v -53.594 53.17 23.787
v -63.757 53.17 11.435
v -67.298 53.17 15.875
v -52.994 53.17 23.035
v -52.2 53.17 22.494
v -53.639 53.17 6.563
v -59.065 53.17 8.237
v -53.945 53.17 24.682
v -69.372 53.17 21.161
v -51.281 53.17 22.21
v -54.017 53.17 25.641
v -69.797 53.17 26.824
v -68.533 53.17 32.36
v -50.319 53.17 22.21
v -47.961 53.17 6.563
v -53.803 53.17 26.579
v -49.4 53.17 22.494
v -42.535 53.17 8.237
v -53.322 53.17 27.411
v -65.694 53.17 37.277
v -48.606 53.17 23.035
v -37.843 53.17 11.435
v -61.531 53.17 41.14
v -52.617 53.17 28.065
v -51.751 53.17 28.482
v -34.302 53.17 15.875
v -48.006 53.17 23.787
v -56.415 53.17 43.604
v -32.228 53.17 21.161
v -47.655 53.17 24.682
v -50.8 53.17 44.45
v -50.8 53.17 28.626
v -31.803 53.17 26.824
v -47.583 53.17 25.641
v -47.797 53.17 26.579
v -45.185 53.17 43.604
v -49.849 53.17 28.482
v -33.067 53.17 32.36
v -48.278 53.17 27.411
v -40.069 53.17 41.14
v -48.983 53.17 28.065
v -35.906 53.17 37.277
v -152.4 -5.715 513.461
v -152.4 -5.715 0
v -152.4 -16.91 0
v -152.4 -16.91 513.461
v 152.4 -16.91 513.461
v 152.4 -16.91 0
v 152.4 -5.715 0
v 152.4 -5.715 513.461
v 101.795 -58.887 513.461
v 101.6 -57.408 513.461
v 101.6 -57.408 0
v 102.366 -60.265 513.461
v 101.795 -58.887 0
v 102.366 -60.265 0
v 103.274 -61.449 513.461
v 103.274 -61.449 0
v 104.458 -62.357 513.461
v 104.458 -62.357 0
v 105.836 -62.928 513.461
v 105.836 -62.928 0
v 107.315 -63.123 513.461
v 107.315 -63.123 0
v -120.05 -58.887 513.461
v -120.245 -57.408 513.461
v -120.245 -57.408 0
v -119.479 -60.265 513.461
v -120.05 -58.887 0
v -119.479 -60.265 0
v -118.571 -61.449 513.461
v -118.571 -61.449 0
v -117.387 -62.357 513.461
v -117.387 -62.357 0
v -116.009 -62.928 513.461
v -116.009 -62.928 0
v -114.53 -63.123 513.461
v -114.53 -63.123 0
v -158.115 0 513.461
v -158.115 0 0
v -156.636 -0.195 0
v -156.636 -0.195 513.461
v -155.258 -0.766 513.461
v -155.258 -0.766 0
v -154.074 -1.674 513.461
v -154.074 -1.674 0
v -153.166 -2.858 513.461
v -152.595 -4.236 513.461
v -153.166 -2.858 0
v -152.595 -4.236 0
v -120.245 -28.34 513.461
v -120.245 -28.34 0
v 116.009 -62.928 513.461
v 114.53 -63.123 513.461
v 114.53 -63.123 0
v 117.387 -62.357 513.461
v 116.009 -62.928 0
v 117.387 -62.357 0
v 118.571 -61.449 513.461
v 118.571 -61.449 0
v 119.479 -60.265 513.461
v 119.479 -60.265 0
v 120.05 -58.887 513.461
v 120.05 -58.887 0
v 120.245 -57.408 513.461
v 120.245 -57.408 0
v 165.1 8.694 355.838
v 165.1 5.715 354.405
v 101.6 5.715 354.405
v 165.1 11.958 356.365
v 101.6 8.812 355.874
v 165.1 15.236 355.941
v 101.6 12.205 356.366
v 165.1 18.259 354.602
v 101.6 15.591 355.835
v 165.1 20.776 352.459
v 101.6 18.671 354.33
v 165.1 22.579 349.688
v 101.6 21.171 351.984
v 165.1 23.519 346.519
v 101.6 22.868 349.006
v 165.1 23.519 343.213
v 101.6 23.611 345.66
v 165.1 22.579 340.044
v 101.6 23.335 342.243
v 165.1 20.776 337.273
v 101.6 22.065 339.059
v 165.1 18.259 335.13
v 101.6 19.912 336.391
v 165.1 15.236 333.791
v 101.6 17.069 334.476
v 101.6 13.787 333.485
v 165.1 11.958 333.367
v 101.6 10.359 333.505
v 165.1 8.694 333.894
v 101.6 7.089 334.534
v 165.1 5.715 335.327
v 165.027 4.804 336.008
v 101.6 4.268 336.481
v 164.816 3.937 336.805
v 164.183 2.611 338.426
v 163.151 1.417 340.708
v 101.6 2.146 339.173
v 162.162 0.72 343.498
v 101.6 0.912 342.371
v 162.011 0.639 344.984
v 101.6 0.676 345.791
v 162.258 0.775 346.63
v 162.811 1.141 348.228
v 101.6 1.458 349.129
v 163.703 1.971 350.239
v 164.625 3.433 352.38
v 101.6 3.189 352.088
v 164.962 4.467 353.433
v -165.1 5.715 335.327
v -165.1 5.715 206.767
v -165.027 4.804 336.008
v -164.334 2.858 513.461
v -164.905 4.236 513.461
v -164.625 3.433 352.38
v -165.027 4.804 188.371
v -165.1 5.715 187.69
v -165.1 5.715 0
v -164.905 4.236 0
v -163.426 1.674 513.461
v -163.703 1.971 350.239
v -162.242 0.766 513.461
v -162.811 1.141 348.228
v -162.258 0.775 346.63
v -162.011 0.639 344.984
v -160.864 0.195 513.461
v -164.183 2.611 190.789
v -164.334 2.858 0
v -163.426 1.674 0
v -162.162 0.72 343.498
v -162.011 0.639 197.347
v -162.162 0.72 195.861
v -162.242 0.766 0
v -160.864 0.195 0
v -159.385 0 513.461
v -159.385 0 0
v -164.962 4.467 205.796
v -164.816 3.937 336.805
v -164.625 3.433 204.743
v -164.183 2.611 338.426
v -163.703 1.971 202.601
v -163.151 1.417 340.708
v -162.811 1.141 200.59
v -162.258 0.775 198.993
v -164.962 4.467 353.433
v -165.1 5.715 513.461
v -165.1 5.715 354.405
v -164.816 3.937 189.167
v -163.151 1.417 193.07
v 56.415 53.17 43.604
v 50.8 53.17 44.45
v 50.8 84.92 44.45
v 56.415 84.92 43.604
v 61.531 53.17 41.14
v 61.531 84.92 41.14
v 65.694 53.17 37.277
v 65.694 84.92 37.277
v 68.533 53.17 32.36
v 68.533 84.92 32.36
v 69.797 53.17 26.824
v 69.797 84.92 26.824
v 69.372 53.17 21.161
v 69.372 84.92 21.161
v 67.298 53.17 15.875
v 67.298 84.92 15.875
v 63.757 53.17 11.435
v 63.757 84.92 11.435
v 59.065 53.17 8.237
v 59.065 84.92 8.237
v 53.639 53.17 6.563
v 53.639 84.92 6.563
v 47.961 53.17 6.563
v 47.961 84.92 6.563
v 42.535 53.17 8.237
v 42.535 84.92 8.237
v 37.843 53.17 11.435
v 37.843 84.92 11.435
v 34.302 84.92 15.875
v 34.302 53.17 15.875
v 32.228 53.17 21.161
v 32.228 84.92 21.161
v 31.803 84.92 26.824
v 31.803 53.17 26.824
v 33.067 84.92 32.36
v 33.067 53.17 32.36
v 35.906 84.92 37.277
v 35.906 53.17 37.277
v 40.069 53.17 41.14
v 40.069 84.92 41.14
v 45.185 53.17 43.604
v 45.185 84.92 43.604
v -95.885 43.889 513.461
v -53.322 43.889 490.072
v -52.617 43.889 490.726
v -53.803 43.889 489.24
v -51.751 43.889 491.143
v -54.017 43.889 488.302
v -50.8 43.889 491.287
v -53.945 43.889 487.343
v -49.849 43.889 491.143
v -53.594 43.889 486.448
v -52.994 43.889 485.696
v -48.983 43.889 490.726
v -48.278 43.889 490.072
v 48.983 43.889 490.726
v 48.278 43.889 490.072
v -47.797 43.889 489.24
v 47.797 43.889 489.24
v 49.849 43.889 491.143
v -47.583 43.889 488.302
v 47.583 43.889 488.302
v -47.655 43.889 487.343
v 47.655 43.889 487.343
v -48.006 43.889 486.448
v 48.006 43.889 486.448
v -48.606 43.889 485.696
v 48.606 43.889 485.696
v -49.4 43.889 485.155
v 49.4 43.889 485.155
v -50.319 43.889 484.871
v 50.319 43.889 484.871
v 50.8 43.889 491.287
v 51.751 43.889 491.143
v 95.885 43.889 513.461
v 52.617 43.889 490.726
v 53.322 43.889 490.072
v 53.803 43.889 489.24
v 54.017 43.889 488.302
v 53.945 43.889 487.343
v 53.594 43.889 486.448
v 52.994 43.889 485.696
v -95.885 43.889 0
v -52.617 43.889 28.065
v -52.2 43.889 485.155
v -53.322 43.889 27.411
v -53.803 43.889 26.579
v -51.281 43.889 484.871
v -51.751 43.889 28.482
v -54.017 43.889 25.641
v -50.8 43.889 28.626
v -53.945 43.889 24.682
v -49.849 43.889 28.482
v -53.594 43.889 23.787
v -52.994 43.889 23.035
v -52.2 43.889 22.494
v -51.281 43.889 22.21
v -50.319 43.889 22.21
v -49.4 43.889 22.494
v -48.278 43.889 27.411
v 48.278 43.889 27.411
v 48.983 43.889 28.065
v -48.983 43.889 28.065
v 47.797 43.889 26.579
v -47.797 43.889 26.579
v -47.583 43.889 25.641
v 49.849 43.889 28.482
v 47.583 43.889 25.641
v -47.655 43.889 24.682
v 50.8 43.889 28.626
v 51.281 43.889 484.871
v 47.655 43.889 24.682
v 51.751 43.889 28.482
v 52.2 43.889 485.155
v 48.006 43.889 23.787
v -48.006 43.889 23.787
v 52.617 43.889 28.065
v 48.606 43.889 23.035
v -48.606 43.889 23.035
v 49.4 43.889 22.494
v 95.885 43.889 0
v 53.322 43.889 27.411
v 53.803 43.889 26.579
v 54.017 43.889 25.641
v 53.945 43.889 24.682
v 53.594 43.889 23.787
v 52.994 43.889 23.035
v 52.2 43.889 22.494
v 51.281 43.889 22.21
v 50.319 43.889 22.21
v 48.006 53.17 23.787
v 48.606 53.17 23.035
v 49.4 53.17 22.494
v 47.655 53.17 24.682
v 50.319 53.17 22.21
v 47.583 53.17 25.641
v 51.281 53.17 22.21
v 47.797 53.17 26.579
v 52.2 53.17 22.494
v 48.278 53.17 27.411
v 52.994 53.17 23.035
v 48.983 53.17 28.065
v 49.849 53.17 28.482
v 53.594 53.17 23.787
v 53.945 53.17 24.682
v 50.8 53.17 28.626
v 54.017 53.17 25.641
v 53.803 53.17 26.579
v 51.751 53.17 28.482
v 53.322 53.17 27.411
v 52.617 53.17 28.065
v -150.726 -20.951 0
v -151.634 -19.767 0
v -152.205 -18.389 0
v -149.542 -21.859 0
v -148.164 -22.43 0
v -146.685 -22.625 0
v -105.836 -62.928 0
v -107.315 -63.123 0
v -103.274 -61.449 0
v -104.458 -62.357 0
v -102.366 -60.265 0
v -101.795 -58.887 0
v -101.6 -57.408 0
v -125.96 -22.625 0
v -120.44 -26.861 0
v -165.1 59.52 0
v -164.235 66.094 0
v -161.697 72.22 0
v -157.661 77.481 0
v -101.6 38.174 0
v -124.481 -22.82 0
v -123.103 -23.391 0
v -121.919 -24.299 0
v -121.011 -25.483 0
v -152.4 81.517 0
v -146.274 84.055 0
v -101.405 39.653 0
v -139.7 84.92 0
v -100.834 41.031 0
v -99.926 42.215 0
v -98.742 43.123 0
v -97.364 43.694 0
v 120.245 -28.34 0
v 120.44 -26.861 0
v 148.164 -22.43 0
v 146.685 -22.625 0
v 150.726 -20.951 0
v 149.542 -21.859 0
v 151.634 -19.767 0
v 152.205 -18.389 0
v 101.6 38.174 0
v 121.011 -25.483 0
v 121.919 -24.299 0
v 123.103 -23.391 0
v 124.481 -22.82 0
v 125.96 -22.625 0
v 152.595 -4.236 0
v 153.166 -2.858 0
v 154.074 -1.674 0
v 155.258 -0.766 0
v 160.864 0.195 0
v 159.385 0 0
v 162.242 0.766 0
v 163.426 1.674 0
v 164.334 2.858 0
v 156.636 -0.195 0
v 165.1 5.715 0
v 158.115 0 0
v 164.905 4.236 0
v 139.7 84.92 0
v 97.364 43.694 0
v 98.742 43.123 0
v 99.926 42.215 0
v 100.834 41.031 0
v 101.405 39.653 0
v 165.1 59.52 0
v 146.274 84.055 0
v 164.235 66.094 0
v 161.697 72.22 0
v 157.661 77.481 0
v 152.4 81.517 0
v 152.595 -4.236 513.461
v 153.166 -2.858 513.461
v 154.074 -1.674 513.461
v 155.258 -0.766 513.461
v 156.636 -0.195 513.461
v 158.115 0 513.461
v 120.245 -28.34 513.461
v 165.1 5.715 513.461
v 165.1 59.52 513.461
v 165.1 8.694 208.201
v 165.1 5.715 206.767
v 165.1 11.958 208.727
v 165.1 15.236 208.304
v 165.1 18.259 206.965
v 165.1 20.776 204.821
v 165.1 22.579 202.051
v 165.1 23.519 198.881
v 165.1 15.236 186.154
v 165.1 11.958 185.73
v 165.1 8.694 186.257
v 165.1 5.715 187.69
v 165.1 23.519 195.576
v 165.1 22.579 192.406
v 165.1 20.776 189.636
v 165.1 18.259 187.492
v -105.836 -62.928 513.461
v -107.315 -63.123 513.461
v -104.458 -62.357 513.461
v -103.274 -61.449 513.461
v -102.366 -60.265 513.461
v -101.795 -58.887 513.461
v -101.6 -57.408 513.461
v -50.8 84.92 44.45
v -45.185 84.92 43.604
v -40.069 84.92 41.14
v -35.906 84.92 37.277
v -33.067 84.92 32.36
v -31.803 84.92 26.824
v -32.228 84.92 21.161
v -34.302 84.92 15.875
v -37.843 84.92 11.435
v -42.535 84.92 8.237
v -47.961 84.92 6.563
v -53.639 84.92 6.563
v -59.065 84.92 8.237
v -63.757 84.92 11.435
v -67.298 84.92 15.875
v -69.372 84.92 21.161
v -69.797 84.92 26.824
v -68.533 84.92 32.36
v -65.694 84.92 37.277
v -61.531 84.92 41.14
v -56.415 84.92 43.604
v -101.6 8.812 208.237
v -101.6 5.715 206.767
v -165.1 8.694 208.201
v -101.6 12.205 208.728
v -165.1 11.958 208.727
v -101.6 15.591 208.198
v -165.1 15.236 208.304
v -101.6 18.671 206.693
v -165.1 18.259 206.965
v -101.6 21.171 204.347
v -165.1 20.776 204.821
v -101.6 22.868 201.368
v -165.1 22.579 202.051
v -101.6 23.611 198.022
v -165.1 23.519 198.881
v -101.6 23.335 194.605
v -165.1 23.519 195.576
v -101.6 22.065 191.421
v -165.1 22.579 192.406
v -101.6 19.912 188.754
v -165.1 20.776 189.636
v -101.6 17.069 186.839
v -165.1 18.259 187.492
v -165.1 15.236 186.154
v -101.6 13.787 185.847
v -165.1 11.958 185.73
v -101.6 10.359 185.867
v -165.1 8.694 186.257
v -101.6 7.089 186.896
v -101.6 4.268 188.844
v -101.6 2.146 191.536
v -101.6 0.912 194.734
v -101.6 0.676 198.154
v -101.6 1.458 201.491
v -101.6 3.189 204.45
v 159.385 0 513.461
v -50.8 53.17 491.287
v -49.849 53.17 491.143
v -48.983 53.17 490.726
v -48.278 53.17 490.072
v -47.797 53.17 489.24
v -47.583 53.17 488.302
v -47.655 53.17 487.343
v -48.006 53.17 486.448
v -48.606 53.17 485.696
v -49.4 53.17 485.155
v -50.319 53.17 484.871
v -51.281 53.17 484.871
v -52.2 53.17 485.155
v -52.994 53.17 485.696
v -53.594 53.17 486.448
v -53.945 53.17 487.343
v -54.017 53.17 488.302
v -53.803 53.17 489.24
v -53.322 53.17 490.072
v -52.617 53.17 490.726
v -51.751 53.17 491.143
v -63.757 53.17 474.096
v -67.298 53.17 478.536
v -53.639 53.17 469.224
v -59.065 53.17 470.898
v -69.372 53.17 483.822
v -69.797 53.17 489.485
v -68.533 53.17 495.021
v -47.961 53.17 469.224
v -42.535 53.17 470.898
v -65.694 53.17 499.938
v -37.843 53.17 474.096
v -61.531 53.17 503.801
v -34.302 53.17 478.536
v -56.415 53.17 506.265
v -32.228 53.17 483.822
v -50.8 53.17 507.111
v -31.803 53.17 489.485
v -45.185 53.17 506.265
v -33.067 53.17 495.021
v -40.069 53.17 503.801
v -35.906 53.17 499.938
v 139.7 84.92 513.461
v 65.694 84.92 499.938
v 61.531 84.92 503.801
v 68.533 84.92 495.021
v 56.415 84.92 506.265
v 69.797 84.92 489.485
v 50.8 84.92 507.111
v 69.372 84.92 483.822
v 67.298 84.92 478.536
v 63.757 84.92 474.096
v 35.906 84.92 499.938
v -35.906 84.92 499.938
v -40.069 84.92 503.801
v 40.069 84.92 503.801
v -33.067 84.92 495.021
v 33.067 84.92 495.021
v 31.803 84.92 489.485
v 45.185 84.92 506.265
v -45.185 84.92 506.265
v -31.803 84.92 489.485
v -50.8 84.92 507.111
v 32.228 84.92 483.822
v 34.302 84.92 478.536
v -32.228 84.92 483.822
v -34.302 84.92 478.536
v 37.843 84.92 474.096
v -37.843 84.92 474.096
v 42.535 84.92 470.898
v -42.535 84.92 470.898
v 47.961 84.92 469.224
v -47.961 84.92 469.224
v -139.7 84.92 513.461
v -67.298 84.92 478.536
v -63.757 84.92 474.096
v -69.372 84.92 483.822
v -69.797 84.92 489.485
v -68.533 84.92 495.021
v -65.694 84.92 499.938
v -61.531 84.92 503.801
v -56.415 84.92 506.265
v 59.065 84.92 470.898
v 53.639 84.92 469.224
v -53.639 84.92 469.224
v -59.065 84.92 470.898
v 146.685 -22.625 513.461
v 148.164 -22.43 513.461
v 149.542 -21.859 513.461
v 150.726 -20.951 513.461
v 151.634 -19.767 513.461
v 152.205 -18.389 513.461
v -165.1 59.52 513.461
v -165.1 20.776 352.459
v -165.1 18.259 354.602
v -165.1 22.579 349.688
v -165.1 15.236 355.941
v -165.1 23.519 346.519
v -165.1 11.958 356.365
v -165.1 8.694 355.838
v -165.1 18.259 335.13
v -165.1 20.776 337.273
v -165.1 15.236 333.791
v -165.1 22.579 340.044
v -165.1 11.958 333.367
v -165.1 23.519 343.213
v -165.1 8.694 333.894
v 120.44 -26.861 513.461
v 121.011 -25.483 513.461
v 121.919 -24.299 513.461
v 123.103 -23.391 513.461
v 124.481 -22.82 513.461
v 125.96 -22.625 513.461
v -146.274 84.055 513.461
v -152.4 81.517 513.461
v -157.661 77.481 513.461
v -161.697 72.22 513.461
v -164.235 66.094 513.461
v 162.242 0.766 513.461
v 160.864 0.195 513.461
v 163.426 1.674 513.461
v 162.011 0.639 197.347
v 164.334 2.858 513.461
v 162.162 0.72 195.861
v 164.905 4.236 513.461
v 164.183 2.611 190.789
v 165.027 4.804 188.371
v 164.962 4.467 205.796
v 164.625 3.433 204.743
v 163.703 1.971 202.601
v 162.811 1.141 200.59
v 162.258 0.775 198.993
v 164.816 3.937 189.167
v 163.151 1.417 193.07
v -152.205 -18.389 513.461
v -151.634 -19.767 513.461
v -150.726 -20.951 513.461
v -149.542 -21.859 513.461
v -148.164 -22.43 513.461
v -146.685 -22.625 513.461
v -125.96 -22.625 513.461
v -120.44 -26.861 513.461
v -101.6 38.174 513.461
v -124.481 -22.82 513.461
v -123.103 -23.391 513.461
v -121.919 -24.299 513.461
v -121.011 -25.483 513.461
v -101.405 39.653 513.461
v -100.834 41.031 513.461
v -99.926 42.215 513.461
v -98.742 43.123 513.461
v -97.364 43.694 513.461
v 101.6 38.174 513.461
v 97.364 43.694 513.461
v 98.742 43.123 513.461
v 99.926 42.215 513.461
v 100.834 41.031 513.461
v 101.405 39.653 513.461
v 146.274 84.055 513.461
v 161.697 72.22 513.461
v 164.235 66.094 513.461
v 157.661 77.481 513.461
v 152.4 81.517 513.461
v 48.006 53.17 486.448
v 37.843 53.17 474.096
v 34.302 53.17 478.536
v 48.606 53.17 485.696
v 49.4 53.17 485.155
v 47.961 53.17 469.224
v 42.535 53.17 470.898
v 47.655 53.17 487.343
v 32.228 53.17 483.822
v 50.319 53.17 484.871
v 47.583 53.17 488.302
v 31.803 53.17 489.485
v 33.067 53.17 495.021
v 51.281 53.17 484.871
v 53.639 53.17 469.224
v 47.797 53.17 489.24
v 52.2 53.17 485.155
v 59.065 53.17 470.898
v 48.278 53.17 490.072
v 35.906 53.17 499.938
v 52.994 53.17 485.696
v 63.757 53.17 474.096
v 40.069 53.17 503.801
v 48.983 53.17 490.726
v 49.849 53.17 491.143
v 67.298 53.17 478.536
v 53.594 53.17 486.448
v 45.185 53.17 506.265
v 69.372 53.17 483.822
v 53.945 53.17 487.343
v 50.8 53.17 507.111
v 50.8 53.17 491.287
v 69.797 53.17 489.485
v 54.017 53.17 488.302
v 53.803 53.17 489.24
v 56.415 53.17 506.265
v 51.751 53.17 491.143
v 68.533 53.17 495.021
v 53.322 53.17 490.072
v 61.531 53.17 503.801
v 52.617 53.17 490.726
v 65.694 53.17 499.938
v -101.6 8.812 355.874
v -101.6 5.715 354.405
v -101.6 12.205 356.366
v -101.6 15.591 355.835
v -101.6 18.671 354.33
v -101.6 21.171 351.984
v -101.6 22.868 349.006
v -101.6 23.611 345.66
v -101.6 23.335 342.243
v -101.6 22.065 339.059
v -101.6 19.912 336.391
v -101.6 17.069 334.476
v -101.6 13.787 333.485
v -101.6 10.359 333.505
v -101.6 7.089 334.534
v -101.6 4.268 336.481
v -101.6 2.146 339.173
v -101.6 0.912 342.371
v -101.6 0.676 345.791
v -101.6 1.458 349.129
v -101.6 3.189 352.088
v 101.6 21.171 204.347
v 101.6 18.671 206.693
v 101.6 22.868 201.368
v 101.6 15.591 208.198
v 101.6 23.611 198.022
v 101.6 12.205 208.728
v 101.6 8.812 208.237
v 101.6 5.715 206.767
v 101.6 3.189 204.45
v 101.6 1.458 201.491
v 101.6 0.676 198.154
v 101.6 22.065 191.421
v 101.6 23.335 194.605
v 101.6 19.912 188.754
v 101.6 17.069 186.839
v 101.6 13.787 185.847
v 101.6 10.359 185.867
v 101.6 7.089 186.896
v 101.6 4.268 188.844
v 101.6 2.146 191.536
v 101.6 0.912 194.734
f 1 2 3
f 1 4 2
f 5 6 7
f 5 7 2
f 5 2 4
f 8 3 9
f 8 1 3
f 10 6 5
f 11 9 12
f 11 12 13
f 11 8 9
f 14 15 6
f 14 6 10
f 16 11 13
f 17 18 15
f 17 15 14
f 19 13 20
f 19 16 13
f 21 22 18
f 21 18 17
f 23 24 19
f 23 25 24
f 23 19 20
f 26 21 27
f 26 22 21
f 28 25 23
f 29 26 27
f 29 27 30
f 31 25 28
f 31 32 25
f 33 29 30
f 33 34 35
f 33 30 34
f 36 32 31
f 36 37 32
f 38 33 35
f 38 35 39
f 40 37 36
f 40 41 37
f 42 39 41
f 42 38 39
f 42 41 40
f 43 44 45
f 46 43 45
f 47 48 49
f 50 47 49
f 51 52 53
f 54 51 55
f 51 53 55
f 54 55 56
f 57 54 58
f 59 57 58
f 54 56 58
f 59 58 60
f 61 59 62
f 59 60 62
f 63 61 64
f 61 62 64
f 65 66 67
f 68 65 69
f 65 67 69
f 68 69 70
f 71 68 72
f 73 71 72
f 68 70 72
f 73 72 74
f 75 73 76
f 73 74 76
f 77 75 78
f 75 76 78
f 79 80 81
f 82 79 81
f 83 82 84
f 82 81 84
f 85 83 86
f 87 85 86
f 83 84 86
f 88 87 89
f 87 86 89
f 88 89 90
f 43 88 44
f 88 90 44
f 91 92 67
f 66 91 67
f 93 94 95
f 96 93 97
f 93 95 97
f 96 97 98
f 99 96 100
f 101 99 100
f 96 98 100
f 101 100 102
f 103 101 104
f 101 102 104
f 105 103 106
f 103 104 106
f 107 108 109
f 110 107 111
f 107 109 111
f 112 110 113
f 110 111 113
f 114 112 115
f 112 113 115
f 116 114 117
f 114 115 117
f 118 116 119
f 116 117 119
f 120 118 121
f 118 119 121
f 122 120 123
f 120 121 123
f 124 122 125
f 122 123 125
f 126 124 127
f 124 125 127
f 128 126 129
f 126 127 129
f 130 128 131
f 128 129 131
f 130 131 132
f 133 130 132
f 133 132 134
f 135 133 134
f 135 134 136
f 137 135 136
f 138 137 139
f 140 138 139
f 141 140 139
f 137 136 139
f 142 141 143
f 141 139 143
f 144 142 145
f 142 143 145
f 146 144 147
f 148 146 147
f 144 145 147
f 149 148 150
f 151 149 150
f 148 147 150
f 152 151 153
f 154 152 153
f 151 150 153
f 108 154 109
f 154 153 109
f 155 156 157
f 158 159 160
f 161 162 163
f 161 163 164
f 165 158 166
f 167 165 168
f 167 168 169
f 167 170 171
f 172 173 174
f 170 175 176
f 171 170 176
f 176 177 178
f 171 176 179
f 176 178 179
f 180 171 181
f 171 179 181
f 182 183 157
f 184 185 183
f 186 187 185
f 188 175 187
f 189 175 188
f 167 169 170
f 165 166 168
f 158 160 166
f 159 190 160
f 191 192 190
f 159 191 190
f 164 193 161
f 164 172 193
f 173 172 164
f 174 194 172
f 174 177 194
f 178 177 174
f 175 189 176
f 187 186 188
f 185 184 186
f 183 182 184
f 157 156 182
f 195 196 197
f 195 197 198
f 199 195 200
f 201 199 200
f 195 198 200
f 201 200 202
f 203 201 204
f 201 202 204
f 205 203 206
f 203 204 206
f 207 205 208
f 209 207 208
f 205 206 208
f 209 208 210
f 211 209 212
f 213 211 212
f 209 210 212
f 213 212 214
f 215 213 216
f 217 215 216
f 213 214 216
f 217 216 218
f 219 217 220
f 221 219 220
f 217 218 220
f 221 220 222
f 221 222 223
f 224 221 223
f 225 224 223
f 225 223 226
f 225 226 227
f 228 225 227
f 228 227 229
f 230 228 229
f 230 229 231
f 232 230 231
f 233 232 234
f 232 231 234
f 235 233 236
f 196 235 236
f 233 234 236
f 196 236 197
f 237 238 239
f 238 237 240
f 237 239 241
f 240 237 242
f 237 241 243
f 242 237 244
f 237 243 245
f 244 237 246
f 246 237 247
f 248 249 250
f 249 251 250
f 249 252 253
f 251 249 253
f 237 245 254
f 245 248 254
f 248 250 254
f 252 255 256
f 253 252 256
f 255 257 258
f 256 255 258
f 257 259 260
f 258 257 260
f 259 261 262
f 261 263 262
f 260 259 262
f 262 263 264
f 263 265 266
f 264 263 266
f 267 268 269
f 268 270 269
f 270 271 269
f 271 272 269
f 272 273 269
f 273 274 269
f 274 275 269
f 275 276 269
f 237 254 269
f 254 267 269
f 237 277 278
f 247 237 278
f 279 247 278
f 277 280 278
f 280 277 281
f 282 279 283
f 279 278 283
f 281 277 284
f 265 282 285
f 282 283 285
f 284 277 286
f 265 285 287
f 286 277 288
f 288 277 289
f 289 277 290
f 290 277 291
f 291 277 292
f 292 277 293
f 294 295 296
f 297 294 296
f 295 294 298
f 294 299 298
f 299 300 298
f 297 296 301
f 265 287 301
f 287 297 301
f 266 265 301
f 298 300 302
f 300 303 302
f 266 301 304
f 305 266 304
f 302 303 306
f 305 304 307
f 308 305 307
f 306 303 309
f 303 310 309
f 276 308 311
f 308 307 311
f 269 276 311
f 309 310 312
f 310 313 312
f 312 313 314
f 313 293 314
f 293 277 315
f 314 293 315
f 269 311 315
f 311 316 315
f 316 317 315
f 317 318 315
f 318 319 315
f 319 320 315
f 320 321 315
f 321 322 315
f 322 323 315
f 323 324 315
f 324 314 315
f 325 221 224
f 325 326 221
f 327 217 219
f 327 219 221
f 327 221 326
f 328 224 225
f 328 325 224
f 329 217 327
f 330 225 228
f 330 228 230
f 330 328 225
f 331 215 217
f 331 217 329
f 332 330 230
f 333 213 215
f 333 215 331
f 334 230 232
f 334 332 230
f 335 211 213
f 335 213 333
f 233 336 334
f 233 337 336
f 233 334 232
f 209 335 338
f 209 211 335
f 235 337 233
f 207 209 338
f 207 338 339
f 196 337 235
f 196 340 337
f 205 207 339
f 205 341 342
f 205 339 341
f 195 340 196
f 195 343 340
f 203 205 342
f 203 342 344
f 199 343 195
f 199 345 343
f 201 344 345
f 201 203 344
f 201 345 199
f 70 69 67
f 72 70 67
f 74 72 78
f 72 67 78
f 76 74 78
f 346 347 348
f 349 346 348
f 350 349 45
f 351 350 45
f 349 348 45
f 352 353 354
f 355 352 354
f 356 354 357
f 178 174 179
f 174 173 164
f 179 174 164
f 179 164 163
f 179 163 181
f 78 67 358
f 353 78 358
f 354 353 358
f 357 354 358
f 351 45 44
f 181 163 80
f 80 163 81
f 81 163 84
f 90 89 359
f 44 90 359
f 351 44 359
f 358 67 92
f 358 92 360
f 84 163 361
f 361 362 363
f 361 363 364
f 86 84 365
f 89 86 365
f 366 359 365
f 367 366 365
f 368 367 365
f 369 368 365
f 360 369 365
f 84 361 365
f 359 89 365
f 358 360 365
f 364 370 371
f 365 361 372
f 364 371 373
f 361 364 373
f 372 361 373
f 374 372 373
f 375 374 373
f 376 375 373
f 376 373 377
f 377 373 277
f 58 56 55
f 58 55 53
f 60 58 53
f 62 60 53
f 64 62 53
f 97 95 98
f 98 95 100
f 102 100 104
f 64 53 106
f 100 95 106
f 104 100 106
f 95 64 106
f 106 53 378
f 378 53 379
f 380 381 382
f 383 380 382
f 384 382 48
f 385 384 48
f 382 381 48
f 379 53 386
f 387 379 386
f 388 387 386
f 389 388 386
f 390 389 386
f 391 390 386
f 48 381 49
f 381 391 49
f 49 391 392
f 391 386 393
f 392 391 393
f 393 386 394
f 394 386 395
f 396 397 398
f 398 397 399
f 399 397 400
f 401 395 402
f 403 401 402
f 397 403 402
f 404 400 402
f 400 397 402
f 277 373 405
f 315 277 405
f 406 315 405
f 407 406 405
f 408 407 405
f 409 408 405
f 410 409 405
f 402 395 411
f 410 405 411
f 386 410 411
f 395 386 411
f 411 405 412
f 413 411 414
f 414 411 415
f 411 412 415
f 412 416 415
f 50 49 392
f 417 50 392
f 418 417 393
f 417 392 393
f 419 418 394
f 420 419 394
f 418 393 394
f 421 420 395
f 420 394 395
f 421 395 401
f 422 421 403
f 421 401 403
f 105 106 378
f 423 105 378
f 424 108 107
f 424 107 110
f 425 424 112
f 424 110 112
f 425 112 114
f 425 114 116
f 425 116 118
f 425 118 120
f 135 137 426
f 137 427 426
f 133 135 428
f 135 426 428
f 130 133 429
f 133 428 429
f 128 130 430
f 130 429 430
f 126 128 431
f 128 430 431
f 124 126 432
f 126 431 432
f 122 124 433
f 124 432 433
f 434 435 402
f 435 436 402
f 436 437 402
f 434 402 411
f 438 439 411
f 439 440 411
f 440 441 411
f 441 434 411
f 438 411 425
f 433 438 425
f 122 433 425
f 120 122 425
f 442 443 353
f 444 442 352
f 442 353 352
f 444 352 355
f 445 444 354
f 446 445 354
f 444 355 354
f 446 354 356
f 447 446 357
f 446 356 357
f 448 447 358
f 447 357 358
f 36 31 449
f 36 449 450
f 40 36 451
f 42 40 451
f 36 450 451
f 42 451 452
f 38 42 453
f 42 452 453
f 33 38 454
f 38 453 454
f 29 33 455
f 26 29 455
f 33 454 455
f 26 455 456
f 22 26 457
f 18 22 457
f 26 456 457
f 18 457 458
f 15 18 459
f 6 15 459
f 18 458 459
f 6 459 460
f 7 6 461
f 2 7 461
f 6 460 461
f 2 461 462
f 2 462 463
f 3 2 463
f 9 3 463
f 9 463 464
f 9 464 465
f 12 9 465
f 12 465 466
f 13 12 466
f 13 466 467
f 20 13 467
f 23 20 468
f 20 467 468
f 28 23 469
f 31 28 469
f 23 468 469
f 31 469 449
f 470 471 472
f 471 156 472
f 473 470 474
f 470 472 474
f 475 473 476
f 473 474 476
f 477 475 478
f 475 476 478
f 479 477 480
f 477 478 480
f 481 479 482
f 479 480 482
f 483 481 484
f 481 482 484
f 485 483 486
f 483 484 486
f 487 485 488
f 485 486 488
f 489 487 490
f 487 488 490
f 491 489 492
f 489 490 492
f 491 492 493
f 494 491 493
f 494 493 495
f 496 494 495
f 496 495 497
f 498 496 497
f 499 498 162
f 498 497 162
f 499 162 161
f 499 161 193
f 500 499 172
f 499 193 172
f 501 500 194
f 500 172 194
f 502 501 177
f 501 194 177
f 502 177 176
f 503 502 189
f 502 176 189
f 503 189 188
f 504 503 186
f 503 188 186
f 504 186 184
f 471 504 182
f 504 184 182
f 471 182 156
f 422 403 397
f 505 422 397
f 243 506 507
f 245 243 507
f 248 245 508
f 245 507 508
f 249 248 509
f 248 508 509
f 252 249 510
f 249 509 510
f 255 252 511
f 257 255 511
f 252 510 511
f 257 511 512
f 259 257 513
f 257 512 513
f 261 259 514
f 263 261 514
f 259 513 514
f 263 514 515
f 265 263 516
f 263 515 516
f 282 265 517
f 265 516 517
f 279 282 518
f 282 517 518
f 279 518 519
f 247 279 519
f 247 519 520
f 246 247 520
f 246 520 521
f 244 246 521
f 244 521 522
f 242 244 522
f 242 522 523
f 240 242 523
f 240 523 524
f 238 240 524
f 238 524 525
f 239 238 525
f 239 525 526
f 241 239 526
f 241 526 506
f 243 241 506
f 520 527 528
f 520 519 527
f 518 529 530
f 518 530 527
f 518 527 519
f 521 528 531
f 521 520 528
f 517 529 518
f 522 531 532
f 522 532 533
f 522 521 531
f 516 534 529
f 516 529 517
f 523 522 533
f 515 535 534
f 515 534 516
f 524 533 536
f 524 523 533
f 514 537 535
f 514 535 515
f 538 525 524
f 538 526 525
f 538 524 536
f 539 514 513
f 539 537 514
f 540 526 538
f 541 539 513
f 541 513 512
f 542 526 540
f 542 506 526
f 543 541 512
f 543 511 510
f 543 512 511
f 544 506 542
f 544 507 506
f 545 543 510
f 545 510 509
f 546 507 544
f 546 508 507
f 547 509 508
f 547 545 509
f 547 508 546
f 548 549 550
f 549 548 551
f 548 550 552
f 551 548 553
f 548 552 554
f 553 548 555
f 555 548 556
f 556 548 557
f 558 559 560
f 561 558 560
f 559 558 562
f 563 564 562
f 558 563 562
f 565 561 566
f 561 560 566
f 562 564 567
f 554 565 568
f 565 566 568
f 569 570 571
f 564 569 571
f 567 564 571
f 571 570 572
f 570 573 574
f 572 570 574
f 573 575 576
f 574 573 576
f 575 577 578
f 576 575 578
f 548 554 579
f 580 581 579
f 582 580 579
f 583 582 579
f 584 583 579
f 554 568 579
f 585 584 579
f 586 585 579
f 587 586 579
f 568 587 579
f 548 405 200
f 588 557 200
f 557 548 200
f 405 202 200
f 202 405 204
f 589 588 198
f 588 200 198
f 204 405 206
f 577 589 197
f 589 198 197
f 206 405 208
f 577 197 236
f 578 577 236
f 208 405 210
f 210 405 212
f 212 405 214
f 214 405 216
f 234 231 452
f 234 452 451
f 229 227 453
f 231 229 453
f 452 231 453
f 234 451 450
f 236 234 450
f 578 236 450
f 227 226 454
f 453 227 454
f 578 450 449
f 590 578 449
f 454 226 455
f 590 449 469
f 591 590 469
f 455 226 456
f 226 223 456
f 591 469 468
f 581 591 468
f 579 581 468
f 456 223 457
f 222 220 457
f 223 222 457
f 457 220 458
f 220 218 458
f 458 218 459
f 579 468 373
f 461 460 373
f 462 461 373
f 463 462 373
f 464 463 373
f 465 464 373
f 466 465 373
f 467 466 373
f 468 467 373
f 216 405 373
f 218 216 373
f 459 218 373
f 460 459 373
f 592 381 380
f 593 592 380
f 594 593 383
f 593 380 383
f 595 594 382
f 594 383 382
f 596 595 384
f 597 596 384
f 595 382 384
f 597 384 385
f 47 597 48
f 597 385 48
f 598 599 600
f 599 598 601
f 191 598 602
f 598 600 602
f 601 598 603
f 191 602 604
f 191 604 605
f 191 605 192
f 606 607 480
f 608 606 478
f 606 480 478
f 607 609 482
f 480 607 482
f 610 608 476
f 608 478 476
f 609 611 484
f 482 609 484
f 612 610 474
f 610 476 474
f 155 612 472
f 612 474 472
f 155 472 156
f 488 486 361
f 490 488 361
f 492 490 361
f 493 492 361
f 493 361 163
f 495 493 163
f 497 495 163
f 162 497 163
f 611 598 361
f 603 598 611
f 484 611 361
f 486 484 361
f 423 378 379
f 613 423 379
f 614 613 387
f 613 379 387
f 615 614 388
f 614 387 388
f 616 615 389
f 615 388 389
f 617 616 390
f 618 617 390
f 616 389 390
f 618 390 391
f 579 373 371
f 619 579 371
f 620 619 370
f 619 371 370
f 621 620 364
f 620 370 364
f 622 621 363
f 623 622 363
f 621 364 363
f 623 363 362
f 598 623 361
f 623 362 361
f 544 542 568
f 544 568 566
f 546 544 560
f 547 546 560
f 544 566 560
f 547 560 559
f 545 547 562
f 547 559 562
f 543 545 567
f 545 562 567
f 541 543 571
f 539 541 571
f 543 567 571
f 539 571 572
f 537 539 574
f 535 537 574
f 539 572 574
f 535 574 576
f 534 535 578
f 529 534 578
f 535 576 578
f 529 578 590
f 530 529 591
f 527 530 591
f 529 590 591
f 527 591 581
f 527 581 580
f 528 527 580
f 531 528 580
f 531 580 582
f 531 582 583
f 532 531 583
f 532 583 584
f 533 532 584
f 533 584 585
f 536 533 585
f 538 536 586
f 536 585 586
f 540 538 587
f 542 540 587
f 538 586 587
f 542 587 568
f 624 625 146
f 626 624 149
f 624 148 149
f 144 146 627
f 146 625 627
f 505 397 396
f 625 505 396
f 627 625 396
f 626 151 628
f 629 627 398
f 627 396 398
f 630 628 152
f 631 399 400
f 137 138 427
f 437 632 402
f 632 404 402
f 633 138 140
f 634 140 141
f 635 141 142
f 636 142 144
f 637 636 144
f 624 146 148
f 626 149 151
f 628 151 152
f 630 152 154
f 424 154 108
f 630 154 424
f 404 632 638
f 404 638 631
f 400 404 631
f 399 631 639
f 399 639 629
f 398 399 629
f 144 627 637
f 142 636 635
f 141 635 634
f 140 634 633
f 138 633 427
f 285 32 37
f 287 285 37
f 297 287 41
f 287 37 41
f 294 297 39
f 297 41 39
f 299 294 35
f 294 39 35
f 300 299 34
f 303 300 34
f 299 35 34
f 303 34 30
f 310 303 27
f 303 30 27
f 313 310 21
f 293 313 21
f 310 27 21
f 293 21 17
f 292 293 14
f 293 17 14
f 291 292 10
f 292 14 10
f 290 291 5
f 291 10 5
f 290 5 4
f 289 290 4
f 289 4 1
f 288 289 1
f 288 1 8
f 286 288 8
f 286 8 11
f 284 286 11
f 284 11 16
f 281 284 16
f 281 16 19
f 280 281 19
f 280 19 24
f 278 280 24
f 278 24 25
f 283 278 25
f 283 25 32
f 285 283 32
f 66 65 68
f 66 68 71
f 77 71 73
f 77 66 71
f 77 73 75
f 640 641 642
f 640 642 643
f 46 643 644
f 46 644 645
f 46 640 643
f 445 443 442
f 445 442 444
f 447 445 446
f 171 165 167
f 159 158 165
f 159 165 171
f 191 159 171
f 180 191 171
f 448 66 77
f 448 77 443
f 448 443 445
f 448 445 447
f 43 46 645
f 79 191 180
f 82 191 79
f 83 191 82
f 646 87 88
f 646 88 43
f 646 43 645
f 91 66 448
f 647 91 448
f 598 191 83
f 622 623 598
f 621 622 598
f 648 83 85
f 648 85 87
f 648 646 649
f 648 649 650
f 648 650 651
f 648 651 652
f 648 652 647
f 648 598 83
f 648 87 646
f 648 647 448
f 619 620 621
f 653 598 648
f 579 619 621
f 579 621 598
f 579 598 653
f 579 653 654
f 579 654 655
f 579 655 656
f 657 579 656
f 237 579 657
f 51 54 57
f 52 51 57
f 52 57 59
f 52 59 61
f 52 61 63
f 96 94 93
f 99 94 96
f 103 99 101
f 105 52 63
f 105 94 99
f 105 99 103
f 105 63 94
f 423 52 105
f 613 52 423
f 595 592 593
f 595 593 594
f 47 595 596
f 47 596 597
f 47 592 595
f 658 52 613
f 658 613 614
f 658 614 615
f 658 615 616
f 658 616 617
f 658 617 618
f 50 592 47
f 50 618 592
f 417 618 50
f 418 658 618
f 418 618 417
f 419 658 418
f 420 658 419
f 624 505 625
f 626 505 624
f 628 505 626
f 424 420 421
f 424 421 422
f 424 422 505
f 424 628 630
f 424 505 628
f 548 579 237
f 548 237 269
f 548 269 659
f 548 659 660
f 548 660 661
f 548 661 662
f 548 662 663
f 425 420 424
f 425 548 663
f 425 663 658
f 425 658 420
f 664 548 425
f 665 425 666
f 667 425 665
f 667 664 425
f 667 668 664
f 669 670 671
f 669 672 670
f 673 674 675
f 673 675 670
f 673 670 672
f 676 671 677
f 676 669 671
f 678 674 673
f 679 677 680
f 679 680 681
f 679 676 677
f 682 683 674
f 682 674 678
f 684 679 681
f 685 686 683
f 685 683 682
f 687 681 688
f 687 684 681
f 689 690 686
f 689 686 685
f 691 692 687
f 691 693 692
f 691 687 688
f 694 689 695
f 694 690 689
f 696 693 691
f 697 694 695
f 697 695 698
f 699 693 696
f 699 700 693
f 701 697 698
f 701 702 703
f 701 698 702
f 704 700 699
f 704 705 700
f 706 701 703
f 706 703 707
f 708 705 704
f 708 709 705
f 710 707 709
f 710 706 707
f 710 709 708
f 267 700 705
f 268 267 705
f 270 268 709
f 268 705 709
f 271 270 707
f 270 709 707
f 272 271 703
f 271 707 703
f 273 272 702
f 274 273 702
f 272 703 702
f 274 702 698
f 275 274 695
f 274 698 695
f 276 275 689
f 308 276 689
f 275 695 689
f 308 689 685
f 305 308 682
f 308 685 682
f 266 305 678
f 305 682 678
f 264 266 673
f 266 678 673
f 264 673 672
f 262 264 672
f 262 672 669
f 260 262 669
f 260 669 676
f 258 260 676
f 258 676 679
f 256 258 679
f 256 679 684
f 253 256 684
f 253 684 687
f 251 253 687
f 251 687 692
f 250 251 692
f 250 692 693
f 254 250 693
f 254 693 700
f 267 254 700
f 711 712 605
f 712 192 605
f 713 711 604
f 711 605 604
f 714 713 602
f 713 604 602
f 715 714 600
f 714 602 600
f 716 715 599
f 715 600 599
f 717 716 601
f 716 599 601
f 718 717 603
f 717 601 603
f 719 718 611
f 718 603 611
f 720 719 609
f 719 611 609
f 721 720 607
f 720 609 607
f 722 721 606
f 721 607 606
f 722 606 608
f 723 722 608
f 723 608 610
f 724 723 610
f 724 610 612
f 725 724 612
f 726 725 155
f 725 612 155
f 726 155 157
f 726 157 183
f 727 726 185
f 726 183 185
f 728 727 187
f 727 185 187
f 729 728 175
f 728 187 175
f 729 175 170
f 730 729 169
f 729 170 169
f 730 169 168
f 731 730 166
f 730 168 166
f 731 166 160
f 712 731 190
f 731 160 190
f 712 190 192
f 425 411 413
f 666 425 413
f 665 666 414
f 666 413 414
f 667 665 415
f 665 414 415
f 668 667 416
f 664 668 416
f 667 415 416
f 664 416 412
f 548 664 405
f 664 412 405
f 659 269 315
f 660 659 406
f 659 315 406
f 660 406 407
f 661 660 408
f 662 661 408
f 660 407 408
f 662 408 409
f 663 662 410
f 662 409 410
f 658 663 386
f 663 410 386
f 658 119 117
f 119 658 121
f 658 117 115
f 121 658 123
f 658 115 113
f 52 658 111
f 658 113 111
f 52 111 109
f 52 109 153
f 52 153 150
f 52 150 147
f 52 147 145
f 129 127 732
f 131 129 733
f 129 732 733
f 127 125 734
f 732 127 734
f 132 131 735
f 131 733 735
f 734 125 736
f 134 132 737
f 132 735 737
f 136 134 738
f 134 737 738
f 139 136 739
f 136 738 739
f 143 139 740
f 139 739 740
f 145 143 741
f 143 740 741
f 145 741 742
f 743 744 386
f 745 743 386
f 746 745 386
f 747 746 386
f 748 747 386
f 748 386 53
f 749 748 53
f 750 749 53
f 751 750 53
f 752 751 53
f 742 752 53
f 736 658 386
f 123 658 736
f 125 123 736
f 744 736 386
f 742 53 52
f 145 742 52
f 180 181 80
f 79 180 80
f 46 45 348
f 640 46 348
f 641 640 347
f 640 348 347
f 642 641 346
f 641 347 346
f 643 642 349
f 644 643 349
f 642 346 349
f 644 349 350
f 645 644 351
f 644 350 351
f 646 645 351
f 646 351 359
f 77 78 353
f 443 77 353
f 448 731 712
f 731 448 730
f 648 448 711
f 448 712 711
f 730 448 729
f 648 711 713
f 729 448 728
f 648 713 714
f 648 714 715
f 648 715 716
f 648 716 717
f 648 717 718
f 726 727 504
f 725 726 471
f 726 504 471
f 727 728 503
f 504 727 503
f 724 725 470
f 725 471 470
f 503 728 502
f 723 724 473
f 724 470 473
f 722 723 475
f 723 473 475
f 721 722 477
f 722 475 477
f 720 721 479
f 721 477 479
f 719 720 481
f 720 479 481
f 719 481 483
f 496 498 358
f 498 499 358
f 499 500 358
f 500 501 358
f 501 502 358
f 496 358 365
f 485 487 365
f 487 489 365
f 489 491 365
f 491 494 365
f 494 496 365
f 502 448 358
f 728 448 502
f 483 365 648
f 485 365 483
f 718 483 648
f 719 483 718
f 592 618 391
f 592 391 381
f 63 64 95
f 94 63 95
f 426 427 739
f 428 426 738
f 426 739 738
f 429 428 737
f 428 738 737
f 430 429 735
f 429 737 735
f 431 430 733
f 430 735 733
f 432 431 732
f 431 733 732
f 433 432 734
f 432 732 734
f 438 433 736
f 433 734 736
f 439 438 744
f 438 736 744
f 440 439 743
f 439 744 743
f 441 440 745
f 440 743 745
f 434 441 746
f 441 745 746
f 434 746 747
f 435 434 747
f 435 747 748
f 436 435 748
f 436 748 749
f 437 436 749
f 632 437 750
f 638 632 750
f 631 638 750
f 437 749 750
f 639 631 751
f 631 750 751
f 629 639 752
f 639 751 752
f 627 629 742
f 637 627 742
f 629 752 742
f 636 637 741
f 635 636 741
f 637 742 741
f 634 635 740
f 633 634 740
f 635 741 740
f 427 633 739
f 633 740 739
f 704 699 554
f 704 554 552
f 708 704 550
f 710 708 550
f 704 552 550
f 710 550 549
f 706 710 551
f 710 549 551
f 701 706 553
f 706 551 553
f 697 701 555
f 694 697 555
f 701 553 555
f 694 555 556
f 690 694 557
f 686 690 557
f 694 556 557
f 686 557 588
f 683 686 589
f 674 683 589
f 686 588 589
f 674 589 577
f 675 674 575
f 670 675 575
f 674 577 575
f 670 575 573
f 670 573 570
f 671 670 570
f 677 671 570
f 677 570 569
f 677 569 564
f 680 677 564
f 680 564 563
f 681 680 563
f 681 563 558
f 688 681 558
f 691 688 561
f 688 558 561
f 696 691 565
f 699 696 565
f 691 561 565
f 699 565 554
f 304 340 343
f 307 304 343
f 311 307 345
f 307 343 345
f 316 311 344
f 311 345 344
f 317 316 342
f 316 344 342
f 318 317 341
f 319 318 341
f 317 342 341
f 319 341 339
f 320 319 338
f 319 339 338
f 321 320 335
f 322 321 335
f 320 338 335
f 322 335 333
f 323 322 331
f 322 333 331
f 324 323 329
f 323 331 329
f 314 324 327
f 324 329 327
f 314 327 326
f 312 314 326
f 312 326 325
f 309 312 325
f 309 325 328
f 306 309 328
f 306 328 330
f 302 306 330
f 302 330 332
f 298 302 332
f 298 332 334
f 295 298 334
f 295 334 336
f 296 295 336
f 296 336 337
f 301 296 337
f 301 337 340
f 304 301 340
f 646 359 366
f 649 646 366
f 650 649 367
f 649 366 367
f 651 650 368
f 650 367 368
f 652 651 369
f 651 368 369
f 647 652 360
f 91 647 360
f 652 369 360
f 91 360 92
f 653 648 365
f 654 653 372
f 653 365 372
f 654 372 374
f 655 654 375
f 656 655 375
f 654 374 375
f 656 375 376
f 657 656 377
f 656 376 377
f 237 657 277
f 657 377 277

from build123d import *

# Parameters (mm, degrees)
BOSS_EXTRUDE1_DEPTH = 513.461
SKETCH2_R           = 19.05
CUT_EXTRUDE1_DEPTH  = 31.75
SKETCH3_R           = 3.2258
CUT_EXTRUDE2_DEPTH  = 31.75
SKETCH4_R           = 11.500000003
CUT_EXTRUDE3_DEPTH  = 499.872


with BuildPart() as part:
    # Sketch1 → Boss-Extrude1 (new body)
    with BuildSketch(Plane.XY):
        with BuildLine():
            ThreePointArc((-165.1, 5.715), (-163.426115254, 1.673884746), (-159.385, 0))
            Line((-159.385, 0), (-158.115, 0))
            ThreePointArc((-158.115, 0), (-154.073884746, -1.673884746), (-152.4, -5.715))
            Line((-152.4, -5.715), (-152.4, -16.91))
            ThreePointArc((-152.4, -16.91), (-150.726115254, -20.951115254), (-146.685, -22.625))
            Line((-146.685, -22.625), (-125.96, -22.625))
            ThreePointArc((-125.96, -22.625), (-121.918884746, -24.298884746), (-120.245, -28.34))
            Line((-120.245, -28.34), (-120.245, -57.40750012))
            ThreePointArc((-120.245, -57.40750012), (-118.571115254, -61.448615374), (-114.53, -63.12250012))
            Line((-114.53, -63.12250012), (-107.315, -63.12250012))
            ThreePointArc((-107.315, -63.12250012), (-103.273884746, -61.448615374), (-101.6, -57.40750012))
            Line((-101.6, -57.40750012), (-101.6, 0))
            Line((-101.6, 0), (-101.6, 38.17350945))
            ThreePointArc((-101.6, 38.17350945), (-99.926115254, 42.214624704), (-95.885, 43.88850945))
            Line((-95.885, 43.88850945), (95.885, 43.88850945))
            ThreePointArc((95.885, 43.88850945), (99.926115254, 42.214624704), (101.6, 38.17350945))
            Line((101.6, 38.17350945), (101.6, 0))
            Line((101.6, 0), (101.6, -57.40750012))
            ThreePointArc((101.6, -57.40750012), (103.273884746, -61.448615374), (107.315, -63.12250012))
            Line((107.315, -63.12250012), (114.53, -63.12250012))
            ThreePointArc((114.53, -63.12250012), (118.571115254, -61.448615374), (120.245, -57.40750012))
            Line((120.245, -57.40750012), (120.245, -28.34))
            ThreePointArc((120.245, -28.34), (121.918884746, -24.298884746), (125.96, -22.625))
            Line((125.96, -22.625), (146.685, -22.625))
            ThreePointArc((146.685, -22.625), (150.726115254, -20.951115254), (152.4, -16.91))
            Line((152.4, -16.91), (152.4, -5.715))
            ThreePointArc((152.4, -5.715), (154.073884746, -1.673884746), (158.115, 0))
            Line((158.115, 0), (159.385, 0))
            ThreePointArc((159.385, 0), (163.426115254, 1.673884746), (165.1, 5.715))
            Line((165.1, 5.715), (165.1, 59.52))
            ThreePointArc((165.1, 59.52), (157.660512242, 77.480512242), (139.7, 84.92))
            Line((139.7, 84.92), (-139.7, 84.92))
            ThreePointArc((-139.7, 84.92), (-157.660512242, 77.480512242), (-165.1, 59.52))
            Line((-165.1, 59.52), (-165.1, 5.715))
        make_face()
    extrude(amount=BOSS_EXTRUDE1_DEPTH)

    # Sketch2 → Cut-Extrude1 (cut)
    with BuildSketch(Plane(origin=(0, 84.92, 0), x_dir=(1, 0, 0), z_dir=(0, 1, 0))):
        with Locations((-50.8, -25.4)):
            Circle(SKETCH2_R)
        with Locations((50.8, -25.4)):
            Circle(SKETCH2_R)
        with Locations((50.8, -488.061)):
            Circle(SKETCH2_R)
        with Locations((-50.8, -488.061)):
            Circle(SKETCH2_R)
    extrude(amount=-CUT_EXTRUDE1_DEPTH, mode=Mode.SUBTRACT)

    # Sketch3 → Cut-Extrude2 (cut)
    with BuildSketch(Plane(origin=(0, 53.17, 0), x_dir=(1, 0, 0), z_dir=(0, 1, 0))):
        with Locations((-50.8, -25.4)):
            Circle(SKETCH3_R)
        with Locations((50.8, -25.4)):
            Circle(SKETCH3_R)
        with Locations((50.8, -488.061)):
            Circle(SKETCH3_R)
        with Locations((-50.8, -488.061)):
            Circle(SKETCH3_R)
    extrude(amount=-CUT_EXTRUDE2_DEPTH, mode=Mode.SUBTRACT)

    # Sketch4 → Cut-Extrude3 (cut)
    with BuildSketch(Plane.ZY.offset(165.1)):
        with Locations((344.866041788, 12.13850945)):
            Circle(SKETCH4_R)
        with Locations((197.228541788, 12.13850945)):
            Circle(SKETCH4_R)
    extrude(amount=-CUT_EXTRUDE3_DEPTH, mode=Mode.SUBTRACT)


solid = part.part
